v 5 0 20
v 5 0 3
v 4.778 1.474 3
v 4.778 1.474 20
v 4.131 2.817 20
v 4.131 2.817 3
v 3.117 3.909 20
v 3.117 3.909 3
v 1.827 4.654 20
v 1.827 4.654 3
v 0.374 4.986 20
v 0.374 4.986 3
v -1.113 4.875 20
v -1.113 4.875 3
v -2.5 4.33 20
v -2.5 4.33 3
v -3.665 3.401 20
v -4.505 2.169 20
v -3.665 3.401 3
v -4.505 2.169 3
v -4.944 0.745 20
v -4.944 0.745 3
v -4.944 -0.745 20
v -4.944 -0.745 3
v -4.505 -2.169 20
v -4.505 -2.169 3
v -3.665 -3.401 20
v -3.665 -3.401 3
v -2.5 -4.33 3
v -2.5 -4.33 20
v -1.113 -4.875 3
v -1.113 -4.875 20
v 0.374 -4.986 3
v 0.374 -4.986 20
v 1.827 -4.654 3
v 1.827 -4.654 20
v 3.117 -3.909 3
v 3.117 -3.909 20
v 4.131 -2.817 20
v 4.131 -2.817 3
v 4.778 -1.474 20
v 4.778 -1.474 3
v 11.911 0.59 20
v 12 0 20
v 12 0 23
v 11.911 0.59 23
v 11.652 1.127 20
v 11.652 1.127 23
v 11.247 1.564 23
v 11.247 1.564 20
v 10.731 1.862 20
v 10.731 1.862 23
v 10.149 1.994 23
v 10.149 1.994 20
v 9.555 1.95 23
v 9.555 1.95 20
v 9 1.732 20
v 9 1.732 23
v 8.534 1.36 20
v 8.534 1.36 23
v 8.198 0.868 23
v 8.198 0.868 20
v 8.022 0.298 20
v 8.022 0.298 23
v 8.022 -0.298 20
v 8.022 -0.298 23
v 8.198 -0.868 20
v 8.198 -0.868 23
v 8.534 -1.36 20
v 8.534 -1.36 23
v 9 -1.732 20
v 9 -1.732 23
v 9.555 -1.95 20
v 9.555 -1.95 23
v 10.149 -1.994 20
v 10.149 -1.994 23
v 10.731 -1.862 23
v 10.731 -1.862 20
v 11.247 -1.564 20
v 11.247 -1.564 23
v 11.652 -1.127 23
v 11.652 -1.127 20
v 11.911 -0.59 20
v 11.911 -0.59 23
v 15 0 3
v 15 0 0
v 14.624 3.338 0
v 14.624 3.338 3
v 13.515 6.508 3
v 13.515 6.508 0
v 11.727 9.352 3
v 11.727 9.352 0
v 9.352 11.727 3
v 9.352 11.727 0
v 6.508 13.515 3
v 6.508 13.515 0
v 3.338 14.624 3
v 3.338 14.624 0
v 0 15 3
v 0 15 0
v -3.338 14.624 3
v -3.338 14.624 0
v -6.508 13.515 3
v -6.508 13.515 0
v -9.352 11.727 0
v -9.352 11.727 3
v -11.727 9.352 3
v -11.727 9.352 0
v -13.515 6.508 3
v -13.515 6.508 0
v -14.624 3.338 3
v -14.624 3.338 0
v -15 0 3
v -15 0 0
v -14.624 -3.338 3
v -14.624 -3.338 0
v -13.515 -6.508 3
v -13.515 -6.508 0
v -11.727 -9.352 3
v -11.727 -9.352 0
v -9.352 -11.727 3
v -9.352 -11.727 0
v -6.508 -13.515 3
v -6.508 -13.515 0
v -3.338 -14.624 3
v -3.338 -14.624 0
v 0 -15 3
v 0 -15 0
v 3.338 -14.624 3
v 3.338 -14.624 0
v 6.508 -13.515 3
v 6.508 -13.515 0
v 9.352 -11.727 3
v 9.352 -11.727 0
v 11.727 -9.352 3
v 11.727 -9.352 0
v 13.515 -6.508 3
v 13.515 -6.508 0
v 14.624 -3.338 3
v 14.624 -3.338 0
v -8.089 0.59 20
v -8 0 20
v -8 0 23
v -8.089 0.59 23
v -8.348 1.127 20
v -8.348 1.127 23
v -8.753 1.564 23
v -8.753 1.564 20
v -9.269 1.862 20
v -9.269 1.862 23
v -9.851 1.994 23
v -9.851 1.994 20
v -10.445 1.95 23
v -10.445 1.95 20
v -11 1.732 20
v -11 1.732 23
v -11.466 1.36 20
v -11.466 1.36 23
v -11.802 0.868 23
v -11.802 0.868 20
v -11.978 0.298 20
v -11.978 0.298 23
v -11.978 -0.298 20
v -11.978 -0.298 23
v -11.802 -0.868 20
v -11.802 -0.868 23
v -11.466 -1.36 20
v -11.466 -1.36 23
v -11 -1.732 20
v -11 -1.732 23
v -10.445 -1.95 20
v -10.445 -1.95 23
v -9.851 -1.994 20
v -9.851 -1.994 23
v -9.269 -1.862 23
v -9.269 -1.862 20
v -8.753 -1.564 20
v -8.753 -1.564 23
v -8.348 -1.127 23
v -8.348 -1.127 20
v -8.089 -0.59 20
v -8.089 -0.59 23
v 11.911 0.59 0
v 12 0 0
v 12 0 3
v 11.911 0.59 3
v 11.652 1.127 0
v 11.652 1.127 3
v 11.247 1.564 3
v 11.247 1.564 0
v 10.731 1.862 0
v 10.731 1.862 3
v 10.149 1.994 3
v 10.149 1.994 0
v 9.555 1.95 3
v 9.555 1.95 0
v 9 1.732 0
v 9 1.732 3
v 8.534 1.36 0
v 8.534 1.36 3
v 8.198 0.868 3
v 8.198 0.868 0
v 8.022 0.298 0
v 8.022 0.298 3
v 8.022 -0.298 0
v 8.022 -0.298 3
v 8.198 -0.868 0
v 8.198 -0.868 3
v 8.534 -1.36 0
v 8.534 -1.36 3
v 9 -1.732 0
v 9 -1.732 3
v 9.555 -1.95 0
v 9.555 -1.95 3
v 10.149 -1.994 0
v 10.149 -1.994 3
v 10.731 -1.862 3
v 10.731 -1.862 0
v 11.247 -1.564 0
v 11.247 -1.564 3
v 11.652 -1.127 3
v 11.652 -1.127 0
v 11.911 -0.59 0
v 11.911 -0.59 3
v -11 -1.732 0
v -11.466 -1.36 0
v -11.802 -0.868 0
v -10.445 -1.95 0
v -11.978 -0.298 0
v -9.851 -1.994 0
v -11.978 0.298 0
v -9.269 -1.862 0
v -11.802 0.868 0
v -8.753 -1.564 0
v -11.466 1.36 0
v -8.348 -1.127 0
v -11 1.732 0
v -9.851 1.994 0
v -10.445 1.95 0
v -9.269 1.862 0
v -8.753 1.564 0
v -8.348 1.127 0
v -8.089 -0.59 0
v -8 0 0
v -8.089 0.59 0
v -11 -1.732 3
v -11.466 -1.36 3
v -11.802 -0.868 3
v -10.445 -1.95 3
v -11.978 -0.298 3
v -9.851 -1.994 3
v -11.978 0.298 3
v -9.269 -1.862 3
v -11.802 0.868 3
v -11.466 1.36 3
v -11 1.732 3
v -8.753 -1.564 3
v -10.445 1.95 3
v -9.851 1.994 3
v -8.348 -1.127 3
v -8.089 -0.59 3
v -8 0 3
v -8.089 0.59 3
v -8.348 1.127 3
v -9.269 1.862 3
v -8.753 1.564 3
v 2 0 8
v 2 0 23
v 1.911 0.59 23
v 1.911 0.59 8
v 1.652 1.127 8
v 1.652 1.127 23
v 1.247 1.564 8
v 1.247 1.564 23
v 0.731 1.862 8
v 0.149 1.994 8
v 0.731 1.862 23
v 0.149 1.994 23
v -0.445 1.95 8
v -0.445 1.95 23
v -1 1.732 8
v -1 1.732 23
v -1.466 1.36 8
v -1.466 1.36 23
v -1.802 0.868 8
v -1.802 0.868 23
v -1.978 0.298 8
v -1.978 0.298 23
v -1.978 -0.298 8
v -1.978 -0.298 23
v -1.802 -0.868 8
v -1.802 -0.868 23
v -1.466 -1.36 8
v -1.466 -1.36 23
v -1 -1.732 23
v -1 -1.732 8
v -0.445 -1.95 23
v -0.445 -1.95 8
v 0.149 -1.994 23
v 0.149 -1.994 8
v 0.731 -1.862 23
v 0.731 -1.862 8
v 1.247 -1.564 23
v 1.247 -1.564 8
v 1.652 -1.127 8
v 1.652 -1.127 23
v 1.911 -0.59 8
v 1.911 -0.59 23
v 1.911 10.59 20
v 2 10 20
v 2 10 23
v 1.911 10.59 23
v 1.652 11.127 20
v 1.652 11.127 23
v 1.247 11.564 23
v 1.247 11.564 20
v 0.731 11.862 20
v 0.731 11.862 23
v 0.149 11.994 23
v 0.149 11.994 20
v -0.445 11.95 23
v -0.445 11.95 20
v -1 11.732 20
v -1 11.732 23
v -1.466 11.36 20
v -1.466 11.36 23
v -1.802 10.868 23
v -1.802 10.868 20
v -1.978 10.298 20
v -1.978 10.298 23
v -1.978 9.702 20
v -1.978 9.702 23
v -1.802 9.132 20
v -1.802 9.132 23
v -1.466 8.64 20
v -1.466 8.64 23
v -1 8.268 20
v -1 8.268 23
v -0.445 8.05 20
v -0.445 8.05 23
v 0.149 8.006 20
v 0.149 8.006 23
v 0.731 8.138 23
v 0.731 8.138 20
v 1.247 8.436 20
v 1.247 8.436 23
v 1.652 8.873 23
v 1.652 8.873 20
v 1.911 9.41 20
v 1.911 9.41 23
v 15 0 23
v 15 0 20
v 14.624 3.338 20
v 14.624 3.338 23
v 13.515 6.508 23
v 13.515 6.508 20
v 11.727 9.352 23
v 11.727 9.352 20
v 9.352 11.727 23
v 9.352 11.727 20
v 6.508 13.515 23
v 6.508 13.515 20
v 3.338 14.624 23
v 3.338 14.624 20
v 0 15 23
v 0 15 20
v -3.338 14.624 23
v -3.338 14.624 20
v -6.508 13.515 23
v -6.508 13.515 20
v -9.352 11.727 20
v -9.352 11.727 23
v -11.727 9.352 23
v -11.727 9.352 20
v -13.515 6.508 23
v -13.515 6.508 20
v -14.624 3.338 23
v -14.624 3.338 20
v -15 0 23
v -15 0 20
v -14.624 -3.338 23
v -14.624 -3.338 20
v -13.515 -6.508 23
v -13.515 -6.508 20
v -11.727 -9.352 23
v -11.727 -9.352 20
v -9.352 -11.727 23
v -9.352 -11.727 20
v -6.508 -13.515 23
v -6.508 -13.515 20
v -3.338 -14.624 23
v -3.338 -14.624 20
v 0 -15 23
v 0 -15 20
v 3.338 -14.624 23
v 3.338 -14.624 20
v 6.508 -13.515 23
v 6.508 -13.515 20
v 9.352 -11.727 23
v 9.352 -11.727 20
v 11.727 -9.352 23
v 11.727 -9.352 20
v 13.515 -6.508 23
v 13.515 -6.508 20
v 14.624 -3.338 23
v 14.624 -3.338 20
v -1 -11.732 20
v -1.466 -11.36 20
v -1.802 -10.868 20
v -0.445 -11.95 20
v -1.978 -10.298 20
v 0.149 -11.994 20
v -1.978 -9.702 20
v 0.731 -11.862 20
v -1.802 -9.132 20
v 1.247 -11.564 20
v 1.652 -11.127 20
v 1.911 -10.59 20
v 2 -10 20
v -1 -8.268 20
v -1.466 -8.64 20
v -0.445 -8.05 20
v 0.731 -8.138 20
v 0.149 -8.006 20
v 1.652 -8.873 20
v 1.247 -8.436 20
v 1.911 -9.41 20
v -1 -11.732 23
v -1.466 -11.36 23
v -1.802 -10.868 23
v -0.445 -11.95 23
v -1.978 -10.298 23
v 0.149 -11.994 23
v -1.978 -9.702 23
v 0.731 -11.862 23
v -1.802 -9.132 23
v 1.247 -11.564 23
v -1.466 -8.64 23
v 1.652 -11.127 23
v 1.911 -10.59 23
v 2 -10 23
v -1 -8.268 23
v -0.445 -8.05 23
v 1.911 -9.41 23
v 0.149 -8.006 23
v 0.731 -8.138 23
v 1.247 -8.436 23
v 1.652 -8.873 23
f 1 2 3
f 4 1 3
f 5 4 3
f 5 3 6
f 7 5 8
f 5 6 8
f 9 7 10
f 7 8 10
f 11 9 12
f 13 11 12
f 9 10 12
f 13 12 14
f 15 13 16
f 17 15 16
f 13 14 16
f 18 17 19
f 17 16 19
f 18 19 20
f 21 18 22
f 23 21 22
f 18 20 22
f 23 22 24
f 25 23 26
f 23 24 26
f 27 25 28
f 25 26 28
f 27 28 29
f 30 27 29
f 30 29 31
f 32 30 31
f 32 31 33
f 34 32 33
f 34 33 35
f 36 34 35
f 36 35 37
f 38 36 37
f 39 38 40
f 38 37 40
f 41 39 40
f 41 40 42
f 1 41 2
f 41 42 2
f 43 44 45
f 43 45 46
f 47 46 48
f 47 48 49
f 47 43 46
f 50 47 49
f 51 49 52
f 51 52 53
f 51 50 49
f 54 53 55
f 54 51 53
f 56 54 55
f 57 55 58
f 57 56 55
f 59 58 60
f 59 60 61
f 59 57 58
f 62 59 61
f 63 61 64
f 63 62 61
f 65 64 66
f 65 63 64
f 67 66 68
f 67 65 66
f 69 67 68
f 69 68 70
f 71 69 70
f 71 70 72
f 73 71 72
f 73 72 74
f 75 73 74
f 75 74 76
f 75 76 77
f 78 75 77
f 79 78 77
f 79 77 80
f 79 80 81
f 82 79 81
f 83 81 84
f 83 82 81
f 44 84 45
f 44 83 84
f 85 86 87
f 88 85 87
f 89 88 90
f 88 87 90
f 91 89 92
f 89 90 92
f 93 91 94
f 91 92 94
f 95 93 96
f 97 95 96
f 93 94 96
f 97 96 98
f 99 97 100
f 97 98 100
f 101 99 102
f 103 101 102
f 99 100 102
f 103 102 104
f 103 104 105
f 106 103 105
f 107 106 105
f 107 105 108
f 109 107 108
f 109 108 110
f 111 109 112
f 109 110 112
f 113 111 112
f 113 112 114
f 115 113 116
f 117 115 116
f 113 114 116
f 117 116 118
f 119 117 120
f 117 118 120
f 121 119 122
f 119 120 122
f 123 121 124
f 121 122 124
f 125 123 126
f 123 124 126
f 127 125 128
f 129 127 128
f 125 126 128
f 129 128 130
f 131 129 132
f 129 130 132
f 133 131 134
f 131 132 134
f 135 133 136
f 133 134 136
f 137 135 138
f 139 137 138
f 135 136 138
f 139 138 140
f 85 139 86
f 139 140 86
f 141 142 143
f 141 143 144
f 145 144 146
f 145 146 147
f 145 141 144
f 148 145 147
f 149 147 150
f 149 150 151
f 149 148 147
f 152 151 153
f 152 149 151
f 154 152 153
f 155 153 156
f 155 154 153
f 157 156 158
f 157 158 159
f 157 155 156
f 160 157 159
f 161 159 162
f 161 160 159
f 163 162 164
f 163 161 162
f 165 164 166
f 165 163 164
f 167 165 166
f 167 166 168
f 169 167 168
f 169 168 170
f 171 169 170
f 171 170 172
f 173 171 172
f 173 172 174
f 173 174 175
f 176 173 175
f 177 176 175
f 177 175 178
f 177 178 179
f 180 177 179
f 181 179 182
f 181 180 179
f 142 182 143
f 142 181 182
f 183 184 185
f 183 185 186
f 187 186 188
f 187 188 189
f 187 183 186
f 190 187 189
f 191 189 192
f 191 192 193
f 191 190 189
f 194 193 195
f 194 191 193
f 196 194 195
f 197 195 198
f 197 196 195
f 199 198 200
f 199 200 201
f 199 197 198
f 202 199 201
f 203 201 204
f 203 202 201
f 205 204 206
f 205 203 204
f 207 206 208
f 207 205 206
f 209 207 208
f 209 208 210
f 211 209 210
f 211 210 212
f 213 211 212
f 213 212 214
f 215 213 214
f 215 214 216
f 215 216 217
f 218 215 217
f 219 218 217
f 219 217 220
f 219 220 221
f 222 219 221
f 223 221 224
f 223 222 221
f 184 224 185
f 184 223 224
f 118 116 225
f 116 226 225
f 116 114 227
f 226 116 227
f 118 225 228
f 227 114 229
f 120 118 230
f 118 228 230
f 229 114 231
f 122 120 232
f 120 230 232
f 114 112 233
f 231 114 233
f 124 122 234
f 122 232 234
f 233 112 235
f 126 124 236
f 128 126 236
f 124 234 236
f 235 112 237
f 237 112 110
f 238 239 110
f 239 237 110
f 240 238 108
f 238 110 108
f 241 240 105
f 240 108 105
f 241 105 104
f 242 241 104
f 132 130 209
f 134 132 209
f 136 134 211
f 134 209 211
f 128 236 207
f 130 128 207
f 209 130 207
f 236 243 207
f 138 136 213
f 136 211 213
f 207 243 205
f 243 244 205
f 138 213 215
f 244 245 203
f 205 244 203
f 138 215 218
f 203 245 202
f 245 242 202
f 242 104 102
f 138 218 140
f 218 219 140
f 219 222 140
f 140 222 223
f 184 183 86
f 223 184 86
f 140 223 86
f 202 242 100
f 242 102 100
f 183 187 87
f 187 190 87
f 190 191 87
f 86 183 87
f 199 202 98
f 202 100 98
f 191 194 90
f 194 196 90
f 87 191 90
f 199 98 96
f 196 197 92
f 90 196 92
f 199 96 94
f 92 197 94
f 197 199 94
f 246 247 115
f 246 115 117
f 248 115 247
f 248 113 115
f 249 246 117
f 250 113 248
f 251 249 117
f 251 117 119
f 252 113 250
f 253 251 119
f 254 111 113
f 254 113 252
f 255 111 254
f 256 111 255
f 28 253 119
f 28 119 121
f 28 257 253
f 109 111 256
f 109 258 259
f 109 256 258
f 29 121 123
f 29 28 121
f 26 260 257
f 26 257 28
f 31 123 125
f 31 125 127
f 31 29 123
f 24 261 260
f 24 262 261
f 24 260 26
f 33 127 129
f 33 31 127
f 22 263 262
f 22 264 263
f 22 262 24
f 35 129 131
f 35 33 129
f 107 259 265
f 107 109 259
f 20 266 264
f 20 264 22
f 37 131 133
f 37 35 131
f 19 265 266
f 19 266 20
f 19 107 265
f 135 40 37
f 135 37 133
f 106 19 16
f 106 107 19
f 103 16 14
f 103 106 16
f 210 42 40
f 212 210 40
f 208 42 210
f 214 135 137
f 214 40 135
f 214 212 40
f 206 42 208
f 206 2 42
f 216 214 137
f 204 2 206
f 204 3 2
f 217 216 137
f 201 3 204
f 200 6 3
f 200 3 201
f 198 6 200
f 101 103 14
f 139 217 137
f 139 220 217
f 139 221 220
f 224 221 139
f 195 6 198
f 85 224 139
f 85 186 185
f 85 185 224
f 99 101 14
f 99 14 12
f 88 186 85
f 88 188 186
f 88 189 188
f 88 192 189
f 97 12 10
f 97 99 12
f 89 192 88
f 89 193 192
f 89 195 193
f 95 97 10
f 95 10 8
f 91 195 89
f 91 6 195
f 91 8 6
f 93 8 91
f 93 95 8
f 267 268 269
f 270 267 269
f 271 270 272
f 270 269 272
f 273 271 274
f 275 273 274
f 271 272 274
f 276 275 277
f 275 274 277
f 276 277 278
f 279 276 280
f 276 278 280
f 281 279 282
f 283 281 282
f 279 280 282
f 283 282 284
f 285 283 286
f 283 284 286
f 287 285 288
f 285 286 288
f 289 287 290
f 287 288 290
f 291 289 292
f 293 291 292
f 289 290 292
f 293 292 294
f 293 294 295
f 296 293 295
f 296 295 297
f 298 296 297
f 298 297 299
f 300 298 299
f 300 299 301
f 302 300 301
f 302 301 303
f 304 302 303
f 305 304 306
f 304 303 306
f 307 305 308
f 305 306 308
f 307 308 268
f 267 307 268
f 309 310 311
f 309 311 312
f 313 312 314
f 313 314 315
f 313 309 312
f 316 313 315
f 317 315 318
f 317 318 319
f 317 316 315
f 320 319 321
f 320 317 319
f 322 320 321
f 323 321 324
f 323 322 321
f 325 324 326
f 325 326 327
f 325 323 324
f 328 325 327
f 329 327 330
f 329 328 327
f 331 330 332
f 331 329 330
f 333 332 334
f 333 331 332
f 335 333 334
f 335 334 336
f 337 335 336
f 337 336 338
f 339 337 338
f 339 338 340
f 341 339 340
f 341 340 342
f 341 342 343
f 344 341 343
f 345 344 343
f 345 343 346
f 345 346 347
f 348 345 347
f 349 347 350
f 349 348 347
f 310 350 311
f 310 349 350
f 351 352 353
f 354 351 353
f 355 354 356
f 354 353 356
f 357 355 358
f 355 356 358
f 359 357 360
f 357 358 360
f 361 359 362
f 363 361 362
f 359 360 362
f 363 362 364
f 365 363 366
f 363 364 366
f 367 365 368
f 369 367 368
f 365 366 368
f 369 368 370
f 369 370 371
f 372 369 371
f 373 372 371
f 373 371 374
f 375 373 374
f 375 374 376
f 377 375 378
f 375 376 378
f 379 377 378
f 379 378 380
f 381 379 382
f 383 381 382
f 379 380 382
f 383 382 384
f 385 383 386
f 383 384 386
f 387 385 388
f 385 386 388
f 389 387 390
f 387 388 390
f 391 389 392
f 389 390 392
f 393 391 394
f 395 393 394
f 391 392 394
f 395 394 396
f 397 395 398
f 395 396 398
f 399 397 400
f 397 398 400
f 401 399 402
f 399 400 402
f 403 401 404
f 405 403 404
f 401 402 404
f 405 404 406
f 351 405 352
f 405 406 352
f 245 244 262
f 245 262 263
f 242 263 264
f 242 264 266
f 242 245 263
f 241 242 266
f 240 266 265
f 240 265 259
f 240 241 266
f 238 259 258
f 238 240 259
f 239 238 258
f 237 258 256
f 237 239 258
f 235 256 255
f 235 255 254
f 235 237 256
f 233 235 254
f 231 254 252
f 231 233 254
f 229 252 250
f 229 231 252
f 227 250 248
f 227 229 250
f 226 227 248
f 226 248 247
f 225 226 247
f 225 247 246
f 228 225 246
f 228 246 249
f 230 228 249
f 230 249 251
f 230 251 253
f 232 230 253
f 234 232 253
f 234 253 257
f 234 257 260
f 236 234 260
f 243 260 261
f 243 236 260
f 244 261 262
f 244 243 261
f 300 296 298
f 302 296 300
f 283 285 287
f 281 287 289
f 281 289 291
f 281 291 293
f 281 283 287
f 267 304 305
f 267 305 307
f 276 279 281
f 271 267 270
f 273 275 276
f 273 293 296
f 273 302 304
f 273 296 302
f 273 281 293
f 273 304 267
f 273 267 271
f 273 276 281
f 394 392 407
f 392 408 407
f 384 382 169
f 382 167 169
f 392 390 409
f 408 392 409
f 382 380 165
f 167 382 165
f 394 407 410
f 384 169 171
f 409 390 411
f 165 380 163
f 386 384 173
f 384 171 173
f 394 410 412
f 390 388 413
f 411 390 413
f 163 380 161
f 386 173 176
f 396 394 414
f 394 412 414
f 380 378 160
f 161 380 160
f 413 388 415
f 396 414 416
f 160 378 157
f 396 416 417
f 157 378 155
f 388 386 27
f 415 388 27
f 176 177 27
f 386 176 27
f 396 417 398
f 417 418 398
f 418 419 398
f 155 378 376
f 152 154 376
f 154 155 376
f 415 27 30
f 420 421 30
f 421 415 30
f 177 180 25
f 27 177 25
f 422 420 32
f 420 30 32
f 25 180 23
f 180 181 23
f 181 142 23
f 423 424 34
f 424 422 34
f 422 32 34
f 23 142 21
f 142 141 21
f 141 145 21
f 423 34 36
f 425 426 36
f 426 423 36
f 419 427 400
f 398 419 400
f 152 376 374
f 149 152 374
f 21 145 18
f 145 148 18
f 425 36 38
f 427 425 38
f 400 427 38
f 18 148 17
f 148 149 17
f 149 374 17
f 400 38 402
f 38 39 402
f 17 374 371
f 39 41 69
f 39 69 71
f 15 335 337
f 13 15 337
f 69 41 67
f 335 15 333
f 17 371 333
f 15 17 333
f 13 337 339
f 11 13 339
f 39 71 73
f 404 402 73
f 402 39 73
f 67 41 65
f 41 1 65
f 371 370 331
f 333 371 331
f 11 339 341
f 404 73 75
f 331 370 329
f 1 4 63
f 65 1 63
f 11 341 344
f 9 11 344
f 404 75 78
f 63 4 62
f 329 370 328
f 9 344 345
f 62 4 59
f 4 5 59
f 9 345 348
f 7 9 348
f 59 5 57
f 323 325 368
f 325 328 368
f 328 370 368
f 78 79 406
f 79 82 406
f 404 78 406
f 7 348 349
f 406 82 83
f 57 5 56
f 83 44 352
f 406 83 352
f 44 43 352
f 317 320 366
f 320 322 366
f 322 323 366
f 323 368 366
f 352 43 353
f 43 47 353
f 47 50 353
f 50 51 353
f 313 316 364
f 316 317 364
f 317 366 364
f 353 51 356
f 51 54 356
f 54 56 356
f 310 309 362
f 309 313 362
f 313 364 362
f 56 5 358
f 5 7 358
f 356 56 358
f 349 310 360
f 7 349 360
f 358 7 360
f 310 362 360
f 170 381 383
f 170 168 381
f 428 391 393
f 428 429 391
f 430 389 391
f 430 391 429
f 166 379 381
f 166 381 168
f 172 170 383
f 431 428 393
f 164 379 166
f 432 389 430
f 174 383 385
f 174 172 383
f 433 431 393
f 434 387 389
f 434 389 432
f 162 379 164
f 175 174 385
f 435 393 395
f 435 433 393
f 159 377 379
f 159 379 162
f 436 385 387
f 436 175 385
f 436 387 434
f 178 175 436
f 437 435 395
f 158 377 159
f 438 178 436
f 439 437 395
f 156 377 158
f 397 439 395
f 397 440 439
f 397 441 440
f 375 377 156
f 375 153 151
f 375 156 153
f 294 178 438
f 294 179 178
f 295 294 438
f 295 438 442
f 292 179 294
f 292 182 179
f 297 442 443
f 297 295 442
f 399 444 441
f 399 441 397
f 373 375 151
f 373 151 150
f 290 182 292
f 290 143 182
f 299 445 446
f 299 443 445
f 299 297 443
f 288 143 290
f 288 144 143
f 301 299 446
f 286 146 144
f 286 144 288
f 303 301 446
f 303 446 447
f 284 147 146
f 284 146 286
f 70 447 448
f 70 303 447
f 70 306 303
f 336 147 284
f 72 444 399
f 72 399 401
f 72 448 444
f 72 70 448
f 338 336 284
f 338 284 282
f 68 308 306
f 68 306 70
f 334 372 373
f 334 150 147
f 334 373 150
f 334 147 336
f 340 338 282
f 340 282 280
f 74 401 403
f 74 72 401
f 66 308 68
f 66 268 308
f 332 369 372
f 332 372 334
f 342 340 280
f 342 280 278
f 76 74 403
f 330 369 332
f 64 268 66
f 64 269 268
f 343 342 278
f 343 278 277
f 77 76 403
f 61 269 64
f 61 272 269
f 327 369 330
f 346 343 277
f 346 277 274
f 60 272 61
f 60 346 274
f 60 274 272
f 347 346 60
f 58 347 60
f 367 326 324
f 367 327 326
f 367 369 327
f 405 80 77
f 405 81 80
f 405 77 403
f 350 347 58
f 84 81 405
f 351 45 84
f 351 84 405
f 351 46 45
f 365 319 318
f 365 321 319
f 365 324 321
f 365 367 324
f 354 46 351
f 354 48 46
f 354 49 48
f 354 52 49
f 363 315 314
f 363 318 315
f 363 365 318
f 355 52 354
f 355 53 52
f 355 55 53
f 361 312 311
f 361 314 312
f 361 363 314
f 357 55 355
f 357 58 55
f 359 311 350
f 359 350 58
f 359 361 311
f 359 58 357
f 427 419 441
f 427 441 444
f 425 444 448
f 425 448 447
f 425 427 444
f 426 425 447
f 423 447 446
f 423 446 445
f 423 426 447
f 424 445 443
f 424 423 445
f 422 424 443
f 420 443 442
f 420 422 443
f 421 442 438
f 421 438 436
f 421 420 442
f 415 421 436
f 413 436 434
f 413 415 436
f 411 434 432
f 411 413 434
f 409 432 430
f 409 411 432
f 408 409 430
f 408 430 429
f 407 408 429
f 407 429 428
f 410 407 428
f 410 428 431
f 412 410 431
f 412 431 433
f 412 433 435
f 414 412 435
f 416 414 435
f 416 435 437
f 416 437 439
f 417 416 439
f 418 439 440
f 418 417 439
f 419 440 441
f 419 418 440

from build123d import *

# Parameters (mm, degrees)
SKETCH_1_R          = 15
SKETCH_1_R_2        = 2
EXTRUDE_2_DEPTH     = 3
SKETCH_2_R          = 5
EXTRUDE_3_DEPTH     = 17
SKETCH_4_R          = 15
SKETCH_4_R_2        = 2
EXTRUDE_4_DEPTH     = 3
SKETCH_8_R          = 2
CUT_EXTRUDE_2_DEPTH = 15


with BuildPart() as part:
    # 草图1 → 凸台-拉伸2 (new body)
    with BuildSketch(Plane.XY):
        Circle(SKETCH_1_R)
        with Locations((10, 0)):
            Circle(SKETCH_1_R_2, mode=Mode.SUBTRACT)
        with Locations((-10, 0)):
            Circle(SKETCH_1_R_2, mode=Mode.SUBTRACT)
    extrude(amount=EXTRUDE_2_DEPTH)

    # 草图2 → 凸台-拉伸3 (add)
    with BuildSketch(Plane.XY.offset(3)):
        Circle(SKETCH_2_R)
    extrude(amount=EXTRUDE_3_DEPTH)

    # 草图4 → 凸台-拉伸4 (add)
    with BuildSketch(Plane.XY.offset(20)):
        Circle(SKETCH_4_R)
        with Locations((-10, 0)):
            Circle(SKETCH_4_R_2, mode=Mode.SUBTRACT)
        with Locations((0, 10)):
            Circle(SKETCH_4_R_2, mode=Mode.SUBTRACT)
        with Locations((10, 0)):
            Circle(SKETCH_4_R_2, mode=Mode.SUBTRACT)
        with Locations((0, -10)):
            Circle(SKETCH_4_R_2, mode=Mode.SUBTRACT)
    extrude(amount=EXTRUDE_4_DEPTH)

    # 草图8 → 切除-拉伸2 (cut)
    with BuildSketch(Plane.XY.offset(23)):
        Circle(SKETCH_8_R)
    extrude(amount=-CUT_EXTRUDE_2_DEPTH, mode=Mode.SUBTRACT)


solid = part.part
